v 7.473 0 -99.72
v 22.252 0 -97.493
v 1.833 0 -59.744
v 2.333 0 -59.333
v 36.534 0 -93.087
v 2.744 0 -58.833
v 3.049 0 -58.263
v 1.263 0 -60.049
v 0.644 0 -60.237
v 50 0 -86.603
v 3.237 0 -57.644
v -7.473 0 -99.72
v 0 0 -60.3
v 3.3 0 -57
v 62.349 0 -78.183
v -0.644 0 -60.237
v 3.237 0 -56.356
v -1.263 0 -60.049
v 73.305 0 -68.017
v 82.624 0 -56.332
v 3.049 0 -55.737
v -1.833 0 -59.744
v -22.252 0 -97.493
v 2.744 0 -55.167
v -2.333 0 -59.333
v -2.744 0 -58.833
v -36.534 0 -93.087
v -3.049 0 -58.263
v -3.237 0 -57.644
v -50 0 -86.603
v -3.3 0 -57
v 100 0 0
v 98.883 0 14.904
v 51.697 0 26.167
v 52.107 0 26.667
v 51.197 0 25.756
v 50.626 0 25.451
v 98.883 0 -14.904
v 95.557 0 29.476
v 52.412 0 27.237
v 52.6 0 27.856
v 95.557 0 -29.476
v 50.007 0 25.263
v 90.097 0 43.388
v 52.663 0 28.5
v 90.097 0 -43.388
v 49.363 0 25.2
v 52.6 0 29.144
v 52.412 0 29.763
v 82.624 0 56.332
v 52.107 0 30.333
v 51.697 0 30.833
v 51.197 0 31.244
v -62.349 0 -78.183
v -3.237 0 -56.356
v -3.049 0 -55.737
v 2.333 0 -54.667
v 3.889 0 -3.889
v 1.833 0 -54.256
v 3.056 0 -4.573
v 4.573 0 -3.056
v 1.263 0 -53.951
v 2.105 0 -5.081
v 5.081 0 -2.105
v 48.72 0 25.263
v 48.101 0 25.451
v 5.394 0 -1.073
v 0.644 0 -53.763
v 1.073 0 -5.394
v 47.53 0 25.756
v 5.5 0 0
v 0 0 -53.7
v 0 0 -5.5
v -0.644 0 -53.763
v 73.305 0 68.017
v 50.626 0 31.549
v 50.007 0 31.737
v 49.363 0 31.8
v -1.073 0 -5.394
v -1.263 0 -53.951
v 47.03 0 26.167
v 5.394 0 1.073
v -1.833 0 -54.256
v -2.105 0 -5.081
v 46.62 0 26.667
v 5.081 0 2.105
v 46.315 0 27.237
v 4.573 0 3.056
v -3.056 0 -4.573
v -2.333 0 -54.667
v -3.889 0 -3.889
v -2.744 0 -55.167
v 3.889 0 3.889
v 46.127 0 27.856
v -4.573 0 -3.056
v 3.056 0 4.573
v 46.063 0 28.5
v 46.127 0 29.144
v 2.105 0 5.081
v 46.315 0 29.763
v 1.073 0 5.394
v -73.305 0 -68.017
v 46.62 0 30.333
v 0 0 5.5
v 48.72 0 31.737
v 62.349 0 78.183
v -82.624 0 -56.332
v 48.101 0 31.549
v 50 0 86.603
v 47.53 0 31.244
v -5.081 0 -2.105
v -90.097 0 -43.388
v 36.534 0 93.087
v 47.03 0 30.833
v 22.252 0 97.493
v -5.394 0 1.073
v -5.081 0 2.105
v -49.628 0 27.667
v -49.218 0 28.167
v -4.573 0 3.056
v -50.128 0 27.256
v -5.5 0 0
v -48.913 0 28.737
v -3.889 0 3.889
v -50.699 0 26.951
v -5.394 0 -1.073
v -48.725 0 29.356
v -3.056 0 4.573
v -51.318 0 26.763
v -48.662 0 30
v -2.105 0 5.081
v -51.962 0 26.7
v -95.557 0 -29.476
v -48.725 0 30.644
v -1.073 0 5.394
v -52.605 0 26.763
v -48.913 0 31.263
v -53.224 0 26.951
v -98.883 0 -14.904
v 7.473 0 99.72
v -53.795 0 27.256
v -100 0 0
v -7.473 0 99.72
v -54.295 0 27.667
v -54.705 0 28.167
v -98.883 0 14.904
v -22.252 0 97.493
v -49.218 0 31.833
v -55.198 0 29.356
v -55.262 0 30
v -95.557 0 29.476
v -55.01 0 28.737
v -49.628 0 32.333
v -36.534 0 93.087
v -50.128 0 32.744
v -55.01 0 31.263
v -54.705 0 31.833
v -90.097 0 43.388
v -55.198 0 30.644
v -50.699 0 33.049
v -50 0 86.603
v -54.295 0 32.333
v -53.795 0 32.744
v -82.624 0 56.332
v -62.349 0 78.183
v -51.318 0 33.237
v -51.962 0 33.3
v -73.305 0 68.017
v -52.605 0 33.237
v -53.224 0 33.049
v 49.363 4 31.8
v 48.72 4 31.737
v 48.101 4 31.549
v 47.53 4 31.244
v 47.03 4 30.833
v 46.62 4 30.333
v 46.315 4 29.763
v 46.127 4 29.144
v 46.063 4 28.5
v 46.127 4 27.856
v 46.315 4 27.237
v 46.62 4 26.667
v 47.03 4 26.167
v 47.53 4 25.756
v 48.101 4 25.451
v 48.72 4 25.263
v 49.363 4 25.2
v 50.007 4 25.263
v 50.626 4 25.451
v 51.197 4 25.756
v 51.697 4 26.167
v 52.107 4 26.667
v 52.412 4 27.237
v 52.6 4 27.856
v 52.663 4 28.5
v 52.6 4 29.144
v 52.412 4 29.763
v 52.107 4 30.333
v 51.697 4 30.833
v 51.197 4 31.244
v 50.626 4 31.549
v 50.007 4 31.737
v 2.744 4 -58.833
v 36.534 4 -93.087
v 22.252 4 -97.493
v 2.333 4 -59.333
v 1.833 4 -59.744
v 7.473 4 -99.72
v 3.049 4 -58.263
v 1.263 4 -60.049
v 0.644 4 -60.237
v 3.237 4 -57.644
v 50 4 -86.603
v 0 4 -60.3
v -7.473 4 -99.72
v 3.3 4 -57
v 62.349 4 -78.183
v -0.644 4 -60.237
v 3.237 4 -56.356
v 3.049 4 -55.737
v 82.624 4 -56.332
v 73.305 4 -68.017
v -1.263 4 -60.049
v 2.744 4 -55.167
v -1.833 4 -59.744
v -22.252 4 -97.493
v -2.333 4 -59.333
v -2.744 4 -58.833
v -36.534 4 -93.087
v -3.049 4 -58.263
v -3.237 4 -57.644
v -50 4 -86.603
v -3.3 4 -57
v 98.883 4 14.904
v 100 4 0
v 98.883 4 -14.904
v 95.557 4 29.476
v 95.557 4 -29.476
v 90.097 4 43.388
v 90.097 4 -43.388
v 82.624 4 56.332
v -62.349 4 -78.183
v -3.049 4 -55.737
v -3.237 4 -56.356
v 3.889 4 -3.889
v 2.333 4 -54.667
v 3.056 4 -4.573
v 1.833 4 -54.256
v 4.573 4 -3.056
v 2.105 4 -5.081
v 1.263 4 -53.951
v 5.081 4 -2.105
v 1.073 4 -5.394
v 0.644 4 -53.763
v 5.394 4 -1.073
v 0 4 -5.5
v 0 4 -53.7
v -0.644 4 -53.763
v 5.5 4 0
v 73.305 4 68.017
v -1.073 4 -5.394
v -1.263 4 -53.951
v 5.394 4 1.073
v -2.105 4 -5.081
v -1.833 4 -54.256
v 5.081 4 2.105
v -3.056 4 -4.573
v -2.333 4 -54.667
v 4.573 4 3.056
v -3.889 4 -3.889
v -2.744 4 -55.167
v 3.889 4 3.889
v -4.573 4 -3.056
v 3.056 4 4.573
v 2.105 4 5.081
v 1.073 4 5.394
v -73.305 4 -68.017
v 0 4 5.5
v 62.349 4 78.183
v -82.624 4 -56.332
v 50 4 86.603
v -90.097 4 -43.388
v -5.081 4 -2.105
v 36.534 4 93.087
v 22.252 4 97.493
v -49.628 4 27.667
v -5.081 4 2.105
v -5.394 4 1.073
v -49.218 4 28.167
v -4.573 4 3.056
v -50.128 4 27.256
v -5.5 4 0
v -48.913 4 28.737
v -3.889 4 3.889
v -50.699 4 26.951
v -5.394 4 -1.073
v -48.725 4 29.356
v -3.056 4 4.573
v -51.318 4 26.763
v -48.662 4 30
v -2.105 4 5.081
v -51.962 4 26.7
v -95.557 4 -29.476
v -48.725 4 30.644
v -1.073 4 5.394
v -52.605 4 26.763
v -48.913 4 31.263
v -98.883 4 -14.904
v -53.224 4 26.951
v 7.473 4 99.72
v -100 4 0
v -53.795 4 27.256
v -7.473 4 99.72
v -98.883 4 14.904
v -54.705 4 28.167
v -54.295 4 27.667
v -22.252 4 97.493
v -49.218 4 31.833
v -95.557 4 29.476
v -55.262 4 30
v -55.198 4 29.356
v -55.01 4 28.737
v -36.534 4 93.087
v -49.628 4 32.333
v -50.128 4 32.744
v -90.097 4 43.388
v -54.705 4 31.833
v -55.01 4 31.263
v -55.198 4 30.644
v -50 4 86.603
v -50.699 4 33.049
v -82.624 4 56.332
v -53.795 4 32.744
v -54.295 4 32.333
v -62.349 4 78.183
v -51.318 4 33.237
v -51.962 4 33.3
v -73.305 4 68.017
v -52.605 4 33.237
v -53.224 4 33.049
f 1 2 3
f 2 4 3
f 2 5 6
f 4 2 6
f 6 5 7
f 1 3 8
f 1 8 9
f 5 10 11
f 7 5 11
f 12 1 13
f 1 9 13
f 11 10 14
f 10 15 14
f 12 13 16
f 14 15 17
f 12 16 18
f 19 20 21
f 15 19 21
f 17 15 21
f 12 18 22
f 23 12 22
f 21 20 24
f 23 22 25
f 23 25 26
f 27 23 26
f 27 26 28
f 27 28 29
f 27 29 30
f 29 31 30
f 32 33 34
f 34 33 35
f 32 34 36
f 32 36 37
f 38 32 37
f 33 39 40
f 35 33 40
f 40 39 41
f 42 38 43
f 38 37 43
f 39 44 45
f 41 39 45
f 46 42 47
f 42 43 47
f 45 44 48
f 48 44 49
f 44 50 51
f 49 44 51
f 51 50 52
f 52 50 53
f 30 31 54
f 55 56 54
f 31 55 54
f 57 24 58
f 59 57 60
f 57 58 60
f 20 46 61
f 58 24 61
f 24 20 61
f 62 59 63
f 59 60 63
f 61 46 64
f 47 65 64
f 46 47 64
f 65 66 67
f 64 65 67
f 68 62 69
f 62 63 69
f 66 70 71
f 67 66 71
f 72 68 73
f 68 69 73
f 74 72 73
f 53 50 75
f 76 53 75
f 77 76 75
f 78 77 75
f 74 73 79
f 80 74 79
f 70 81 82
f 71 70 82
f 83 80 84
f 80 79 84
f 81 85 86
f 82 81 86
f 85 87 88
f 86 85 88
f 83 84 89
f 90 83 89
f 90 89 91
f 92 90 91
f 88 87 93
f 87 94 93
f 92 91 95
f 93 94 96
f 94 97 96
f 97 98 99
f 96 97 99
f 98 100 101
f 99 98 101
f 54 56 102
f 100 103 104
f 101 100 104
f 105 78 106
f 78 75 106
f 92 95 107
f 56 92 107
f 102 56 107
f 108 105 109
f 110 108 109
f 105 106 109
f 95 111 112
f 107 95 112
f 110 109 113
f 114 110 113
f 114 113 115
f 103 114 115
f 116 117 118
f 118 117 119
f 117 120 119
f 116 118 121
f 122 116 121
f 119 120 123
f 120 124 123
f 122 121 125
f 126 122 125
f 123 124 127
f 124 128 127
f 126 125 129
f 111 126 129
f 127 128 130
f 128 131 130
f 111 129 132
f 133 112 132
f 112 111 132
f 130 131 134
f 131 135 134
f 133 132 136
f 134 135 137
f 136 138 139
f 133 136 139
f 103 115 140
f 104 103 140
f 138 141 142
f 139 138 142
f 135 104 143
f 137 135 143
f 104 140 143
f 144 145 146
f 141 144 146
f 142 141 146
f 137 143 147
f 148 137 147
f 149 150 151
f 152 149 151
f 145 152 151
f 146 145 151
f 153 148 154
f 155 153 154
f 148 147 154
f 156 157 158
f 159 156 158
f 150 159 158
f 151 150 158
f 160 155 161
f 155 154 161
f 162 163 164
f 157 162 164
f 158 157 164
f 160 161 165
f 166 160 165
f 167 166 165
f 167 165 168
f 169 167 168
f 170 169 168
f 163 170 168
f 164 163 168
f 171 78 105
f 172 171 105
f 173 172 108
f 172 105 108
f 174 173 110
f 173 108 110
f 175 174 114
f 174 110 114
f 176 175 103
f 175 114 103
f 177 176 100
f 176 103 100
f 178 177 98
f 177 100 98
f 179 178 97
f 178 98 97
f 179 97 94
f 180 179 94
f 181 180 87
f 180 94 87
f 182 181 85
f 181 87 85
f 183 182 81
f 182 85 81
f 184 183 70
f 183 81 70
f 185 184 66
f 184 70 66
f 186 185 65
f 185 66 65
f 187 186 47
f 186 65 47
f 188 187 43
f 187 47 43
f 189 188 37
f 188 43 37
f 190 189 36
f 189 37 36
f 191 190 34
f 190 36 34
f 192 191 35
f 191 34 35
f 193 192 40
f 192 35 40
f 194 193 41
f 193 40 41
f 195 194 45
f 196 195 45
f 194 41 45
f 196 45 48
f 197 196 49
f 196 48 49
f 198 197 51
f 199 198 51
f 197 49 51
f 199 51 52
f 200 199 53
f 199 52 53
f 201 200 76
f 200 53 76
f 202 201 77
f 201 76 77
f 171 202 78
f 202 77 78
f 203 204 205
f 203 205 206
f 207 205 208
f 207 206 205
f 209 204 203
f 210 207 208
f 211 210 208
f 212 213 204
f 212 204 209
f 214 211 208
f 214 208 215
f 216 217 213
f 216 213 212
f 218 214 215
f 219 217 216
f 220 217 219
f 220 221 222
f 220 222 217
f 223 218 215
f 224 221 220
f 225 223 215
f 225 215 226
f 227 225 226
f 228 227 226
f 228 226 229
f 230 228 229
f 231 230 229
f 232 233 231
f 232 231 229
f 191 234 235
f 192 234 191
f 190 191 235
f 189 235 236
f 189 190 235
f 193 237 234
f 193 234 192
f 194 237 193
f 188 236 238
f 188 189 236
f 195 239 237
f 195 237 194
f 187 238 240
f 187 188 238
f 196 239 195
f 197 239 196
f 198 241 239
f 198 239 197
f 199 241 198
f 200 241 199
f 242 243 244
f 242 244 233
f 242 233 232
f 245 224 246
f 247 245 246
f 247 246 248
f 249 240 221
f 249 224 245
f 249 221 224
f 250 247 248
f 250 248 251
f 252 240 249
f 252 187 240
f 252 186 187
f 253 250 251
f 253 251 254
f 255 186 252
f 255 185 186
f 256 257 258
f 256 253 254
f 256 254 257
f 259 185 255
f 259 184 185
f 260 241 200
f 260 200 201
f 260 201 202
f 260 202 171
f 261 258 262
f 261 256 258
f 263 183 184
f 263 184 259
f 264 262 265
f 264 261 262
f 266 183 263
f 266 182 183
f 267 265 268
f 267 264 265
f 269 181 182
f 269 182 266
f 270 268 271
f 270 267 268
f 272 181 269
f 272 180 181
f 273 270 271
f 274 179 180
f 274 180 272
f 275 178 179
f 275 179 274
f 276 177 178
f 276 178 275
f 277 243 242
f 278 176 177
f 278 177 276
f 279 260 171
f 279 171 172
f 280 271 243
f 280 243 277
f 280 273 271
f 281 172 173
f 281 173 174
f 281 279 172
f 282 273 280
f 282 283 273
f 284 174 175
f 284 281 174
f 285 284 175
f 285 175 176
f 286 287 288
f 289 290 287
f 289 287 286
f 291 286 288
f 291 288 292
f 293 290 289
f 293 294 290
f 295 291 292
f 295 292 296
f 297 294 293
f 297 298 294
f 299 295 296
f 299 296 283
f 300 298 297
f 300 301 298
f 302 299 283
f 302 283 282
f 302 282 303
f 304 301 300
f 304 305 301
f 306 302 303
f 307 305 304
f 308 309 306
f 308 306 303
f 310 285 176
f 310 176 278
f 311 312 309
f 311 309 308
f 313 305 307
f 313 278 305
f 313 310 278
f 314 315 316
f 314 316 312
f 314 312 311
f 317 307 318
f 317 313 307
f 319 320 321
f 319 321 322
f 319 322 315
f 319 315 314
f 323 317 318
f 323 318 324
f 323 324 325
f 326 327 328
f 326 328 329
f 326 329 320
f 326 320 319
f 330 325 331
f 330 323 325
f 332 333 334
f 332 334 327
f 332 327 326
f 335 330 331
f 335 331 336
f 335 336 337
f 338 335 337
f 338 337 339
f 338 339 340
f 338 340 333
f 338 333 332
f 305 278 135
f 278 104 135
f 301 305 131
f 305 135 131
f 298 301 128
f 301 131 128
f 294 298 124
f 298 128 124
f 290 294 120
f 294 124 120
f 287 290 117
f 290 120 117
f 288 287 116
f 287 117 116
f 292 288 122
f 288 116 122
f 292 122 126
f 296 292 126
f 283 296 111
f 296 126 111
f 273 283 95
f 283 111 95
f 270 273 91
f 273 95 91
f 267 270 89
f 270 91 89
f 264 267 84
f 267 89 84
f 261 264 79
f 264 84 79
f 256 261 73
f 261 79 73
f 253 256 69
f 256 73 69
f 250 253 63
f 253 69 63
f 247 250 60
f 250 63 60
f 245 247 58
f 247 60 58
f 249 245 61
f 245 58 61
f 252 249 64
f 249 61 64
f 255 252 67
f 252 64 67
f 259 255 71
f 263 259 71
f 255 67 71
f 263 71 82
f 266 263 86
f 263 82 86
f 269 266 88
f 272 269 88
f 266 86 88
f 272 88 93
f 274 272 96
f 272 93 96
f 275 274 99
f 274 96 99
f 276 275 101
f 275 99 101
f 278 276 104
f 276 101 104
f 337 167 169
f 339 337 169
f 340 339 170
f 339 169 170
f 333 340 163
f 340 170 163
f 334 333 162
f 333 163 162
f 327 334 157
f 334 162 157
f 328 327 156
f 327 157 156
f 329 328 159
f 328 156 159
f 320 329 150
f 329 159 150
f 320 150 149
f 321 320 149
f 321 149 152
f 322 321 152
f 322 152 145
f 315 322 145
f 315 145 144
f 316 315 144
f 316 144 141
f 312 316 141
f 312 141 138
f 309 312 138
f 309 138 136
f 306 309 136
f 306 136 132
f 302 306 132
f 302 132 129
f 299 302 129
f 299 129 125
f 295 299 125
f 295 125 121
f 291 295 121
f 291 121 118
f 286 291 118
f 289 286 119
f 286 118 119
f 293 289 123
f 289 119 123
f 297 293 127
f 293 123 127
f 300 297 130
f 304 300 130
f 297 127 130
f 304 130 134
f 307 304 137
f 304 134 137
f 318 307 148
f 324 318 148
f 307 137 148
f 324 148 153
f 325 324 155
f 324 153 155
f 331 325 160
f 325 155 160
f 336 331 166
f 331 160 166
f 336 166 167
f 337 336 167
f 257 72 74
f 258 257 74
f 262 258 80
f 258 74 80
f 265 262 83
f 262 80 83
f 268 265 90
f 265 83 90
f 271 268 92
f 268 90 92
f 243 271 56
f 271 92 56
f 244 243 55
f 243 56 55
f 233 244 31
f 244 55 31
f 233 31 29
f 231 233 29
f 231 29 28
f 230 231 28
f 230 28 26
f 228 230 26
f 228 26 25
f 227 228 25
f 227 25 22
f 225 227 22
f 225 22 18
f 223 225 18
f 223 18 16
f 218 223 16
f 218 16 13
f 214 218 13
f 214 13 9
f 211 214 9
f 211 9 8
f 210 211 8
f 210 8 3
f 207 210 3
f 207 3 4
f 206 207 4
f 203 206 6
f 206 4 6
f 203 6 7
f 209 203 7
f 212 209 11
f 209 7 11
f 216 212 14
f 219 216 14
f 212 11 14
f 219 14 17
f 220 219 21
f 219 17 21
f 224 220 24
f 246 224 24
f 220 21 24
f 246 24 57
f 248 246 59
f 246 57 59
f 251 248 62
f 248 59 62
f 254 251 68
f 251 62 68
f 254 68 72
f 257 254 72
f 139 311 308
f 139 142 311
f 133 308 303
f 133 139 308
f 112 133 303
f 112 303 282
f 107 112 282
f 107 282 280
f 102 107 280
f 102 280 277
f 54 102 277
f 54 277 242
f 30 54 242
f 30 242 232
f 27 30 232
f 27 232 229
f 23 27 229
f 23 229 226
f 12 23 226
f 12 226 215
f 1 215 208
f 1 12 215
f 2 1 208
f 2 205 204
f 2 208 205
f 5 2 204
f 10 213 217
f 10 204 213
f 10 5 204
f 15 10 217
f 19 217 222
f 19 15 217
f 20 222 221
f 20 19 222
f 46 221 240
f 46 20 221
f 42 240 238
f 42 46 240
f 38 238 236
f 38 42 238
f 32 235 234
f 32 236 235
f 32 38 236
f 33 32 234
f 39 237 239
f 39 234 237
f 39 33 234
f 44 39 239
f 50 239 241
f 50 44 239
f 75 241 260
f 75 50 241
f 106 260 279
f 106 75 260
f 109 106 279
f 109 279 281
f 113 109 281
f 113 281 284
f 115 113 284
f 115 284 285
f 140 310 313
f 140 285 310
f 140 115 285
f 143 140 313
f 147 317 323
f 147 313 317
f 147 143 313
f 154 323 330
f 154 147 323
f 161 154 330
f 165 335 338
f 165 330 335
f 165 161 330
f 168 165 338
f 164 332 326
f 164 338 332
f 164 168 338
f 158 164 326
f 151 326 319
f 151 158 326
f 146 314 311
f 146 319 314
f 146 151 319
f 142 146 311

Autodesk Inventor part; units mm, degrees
ref_plane "YZ Plane" through (0, 0, 0) normal (1, 0, 0) x (0, 1, 0)
ref_plane "XZ Plane" through (0, 0, 0) normal (0, 1, 0) x (-1, 0, 0)
ref_plane "XY Plane" through (0, 0, 0) normal (0, 0, 1) x (1, 0, 0)
sketch "Sketch1" plane through (0, 0, 0) normal (0, 1, 0) x (-1, 0, 0)
  circle A0 centre (0, 0) radius 100
  dimension "d0" = 200
extrude "Extrusion1" add sketch "Sketch1" along normal blind 4
sketch "Sketch2" plane through (0, 4, 0) normal (0, 1, 0) x (1, 0, 0)
  circle A0 centre (0, 0) radius 100 projected
  circle A1 centre (0, 0) radius 5
  dimension "d3" = 10
hole "Hole1" at (0, 4, 0) direction (0, -1, 0) diameter 11 end through all clearance for "Flat Head Machine Screw" size "M10" standard "Ansi Metric M Profile"
sketch "Sketch4" plane through (0, 4, 0) normal (0, 1, 0) x (1, 0, 0)
  circle A0 centre (0, 57) radius 3.175
  circle A1 centre (-51.9615, -30) radius 3.175
  circle A2 centre (49.3634, -28.5) radius 3.175
  circle A3 centre (0, 0) radius 100 projected
  line L0 (0, 0) -> (0, 57) construction
  line L1 (0, 0) -> (49.3634, -28.5) construction
  line L2 (0, 0) -> (57, 0) construction
  line L3 (0, 0) -> (-51.9615, -30) construction
  line L4 (0, 0) -> (60, 0) construction
  dimension "d28" = 360
  dimension "d24" = 6.35
  dimension "d37" = 57
  dimension "d38" = 57
  dimension "d39" = 30
  dimension "d40" = 60
  dimension "d41" = 150
hole "Hole3" at (0, 4, -57) at (49.3634, 4, 28.5) at (-51.9615, 4, 30) direction (0, -1, 0) diameter 6.6 end through all clearance for "Flat Head Machine Screw" size "M6" standard "Ansi Metric M Profile"
properties part number "bpPlate" material "Steel"
